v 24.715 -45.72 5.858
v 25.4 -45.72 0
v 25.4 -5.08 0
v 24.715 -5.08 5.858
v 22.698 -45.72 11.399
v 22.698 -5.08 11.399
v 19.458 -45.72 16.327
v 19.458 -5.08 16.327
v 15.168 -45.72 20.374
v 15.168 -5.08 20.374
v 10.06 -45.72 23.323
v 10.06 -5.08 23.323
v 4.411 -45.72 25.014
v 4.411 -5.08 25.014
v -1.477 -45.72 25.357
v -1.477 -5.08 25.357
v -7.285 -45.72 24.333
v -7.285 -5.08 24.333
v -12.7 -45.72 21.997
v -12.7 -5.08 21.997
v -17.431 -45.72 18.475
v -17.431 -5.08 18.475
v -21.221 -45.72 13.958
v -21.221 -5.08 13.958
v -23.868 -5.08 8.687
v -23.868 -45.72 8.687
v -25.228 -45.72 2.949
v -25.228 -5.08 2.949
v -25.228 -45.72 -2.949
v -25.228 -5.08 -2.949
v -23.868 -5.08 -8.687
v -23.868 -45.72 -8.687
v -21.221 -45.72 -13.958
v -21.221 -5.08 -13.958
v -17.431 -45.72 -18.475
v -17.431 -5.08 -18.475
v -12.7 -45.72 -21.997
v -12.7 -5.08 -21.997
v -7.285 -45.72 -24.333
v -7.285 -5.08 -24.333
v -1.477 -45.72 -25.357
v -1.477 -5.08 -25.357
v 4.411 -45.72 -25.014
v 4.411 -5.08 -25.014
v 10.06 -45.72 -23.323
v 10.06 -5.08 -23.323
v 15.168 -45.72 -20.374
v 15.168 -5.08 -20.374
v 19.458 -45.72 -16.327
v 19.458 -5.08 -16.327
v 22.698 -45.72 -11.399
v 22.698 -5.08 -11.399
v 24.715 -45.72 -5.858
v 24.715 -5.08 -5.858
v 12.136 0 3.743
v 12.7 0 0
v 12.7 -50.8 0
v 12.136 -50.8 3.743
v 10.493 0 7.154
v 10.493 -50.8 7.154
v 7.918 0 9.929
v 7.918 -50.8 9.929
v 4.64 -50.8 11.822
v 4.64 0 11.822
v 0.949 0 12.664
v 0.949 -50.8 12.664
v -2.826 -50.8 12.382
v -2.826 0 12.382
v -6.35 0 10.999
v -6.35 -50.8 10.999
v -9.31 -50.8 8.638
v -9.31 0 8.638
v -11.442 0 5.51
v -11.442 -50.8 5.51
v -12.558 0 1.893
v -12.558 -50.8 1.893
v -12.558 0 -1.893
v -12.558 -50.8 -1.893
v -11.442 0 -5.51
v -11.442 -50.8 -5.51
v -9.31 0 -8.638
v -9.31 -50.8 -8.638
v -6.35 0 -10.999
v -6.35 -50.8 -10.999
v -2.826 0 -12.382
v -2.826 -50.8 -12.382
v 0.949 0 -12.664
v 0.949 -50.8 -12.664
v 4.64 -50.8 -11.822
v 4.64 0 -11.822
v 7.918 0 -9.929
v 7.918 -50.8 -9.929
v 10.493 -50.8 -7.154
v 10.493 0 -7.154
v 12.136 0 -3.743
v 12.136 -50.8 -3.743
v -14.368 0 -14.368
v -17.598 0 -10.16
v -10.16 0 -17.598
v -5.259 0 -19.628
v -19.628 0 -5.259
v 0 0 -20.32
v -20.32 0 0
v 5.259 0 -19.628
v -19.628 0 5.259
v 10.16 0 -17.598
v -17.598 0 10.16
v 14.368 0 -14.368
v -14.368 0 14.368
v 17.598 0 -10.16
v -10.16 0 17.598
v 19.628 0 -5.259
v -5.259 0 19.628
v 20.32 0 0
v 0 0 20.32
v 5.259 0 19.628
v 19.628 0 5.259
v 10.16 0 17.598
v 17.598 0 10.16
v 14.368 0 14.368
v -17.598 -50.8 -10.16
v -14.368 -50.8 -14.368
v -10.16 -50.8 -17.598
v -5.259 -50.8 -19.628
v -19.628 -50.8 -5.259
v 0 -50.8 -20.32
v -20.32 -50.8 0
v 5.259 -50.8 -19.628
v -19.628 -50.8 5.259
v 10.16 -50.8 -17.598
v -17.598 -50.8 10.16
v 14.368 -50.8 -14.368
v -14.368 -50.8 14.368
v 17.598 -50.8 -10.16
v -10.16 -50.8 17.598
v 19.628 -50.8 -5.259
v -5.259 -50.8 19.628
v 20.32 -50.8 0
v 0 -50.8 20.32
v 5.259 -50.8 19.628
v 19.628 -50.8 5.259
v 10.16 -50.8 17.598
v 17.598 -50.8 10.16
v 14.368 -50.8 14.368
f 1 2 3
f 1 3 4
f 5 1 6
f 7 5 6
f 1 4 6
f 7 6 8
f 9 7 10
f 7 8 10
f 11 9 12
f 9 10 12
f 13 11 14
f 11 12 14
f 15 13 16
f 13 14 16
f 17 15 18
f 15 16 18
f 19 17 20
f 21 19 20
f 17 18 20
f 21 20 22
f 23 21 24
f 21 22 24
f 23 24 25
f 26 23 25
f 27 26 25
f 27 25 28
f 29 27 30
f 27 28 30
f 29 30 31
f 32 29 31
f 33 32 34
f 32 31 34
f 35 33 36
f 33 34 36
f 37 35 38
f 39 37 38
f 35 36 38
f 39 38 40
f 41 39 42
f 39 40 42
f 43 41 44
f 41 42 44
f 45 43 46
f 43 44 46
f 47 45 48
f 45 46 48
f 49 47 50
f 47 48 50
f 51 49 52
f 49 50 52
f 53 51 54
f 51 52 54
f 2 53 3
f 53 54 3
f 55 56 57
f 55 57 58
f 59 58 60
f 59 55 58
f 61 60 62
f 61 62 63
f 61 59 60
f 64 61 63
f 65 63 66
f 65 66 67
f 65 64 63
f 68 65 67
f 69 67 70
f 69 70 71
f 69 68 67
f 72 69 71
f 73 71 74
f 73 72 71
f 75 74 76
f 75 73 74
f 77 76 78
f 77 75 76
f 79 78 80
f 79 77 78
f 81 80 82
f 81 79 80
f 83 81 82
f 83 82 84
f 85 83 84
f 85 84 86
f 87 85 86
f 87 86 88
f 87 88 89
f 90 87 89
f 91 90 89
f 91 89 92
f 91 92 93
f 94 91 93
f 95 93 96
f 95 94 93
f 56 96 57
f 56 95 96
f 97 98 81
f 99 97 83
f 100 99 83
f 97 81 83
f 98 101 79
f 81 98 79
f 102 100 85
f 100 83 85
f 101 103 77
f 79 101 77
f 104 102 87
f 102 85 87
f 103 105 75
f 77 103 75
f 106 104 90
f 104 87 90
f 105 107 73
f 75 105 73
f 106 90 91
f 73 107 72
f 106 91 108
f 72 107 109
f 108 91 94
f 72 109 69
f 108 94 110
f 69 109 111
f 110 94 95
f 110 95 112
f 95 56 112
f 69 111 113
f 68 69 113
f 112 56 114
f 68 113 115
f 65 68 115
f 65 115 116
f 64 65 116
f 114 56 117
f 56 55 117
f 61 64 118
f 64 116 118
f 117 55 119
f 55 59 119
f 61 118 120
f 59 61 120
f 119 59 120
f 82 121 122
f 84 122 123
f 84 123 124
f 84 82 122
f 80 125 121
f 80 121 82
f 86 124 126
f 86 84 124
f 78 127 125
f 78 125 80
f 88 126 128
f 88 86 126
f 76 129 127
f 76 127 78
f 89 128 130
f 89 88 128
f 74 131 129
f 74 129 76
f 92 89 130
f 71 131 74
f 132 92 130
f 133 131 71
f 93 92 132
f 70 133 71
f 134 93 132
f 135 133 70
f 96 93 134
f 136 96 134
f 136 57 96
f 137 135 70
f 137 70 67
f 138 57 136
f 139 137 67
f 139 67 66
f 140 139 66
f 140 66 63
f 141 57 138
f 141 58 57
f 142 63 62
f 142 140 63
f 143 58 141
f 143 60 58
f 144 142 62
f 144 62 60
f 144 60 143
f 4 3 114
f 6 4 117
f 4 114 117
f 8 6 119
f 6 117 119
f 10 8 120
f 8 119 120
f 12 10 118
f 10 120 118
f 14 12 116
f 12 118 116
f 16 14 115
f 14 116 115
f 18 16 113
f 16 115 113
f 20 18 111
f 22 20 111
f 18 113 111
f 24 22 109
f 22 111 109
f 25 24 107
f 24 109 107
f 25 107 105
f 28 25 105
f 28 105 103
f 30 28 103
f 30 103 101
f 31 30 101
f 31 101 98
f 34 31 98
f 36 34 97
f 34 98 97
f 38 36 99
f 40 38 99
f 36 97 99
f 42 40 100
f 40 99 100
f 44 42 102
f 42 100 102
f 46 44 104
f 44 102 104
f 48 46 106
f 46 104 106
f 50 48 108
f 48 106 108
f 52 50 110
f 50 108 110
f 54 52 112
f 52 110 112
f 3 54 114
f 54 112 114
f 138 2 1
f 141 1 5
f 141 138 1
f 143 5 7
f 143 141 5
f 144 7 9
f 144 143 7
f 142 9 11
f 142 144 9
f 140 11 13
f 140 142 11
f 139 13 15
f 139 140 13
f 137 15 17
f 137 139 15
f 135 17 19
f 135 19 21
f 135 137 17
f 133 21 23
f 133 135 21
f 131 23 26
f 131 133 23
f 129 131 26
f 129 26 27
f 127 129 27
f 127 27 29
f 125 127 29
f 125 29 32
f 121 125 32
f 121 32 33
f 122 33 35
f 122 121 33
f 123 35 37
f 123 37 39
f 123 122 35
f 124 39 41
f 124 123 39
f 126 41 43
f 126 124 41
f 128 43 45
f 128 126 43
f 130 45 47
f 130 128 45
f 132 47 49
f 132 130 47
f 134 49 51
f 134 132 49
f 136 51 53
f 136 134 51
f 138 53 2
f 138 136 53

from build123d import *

# Parameters (mm, degrees)
F0_R     = 25.4
F1_DEPTH = 50.8
F2_SIZE  = 5.08
F3_SIZE  = 5.08
F4_R     = 12.7
F5_DEPTH = 50.8


with BuildPart() as f1:
    # F0 (on Front) → F1 (new body)
    with BuildSketch(Plane.XZ):
        Circle(F0_R)
    extrude(amount=F1_DEPTH)

    # F2
    f2_edges = [f1.edges().sort_by_distance(p)[0] for p in [
        (-25.4, -50.8, 0),
    ]]
    chamfer(f2_edges, length=F2_SIZE)

    # F3
    f3_edges = [f1.edges().sort_by_distance(p)[0] for p in [
        (-25.4, 0, 0),
    ]]
    chamfer(f3_edges, length=F3_SIZE)

    # F4 (on Front) → F5 (cut)
    with BuildSketch(Plane.XZ):
        Circle(F4_R)
    extrude(amount=F5_DEPTH, mode=Mode.SUBTRACT)


solid = f1.part
